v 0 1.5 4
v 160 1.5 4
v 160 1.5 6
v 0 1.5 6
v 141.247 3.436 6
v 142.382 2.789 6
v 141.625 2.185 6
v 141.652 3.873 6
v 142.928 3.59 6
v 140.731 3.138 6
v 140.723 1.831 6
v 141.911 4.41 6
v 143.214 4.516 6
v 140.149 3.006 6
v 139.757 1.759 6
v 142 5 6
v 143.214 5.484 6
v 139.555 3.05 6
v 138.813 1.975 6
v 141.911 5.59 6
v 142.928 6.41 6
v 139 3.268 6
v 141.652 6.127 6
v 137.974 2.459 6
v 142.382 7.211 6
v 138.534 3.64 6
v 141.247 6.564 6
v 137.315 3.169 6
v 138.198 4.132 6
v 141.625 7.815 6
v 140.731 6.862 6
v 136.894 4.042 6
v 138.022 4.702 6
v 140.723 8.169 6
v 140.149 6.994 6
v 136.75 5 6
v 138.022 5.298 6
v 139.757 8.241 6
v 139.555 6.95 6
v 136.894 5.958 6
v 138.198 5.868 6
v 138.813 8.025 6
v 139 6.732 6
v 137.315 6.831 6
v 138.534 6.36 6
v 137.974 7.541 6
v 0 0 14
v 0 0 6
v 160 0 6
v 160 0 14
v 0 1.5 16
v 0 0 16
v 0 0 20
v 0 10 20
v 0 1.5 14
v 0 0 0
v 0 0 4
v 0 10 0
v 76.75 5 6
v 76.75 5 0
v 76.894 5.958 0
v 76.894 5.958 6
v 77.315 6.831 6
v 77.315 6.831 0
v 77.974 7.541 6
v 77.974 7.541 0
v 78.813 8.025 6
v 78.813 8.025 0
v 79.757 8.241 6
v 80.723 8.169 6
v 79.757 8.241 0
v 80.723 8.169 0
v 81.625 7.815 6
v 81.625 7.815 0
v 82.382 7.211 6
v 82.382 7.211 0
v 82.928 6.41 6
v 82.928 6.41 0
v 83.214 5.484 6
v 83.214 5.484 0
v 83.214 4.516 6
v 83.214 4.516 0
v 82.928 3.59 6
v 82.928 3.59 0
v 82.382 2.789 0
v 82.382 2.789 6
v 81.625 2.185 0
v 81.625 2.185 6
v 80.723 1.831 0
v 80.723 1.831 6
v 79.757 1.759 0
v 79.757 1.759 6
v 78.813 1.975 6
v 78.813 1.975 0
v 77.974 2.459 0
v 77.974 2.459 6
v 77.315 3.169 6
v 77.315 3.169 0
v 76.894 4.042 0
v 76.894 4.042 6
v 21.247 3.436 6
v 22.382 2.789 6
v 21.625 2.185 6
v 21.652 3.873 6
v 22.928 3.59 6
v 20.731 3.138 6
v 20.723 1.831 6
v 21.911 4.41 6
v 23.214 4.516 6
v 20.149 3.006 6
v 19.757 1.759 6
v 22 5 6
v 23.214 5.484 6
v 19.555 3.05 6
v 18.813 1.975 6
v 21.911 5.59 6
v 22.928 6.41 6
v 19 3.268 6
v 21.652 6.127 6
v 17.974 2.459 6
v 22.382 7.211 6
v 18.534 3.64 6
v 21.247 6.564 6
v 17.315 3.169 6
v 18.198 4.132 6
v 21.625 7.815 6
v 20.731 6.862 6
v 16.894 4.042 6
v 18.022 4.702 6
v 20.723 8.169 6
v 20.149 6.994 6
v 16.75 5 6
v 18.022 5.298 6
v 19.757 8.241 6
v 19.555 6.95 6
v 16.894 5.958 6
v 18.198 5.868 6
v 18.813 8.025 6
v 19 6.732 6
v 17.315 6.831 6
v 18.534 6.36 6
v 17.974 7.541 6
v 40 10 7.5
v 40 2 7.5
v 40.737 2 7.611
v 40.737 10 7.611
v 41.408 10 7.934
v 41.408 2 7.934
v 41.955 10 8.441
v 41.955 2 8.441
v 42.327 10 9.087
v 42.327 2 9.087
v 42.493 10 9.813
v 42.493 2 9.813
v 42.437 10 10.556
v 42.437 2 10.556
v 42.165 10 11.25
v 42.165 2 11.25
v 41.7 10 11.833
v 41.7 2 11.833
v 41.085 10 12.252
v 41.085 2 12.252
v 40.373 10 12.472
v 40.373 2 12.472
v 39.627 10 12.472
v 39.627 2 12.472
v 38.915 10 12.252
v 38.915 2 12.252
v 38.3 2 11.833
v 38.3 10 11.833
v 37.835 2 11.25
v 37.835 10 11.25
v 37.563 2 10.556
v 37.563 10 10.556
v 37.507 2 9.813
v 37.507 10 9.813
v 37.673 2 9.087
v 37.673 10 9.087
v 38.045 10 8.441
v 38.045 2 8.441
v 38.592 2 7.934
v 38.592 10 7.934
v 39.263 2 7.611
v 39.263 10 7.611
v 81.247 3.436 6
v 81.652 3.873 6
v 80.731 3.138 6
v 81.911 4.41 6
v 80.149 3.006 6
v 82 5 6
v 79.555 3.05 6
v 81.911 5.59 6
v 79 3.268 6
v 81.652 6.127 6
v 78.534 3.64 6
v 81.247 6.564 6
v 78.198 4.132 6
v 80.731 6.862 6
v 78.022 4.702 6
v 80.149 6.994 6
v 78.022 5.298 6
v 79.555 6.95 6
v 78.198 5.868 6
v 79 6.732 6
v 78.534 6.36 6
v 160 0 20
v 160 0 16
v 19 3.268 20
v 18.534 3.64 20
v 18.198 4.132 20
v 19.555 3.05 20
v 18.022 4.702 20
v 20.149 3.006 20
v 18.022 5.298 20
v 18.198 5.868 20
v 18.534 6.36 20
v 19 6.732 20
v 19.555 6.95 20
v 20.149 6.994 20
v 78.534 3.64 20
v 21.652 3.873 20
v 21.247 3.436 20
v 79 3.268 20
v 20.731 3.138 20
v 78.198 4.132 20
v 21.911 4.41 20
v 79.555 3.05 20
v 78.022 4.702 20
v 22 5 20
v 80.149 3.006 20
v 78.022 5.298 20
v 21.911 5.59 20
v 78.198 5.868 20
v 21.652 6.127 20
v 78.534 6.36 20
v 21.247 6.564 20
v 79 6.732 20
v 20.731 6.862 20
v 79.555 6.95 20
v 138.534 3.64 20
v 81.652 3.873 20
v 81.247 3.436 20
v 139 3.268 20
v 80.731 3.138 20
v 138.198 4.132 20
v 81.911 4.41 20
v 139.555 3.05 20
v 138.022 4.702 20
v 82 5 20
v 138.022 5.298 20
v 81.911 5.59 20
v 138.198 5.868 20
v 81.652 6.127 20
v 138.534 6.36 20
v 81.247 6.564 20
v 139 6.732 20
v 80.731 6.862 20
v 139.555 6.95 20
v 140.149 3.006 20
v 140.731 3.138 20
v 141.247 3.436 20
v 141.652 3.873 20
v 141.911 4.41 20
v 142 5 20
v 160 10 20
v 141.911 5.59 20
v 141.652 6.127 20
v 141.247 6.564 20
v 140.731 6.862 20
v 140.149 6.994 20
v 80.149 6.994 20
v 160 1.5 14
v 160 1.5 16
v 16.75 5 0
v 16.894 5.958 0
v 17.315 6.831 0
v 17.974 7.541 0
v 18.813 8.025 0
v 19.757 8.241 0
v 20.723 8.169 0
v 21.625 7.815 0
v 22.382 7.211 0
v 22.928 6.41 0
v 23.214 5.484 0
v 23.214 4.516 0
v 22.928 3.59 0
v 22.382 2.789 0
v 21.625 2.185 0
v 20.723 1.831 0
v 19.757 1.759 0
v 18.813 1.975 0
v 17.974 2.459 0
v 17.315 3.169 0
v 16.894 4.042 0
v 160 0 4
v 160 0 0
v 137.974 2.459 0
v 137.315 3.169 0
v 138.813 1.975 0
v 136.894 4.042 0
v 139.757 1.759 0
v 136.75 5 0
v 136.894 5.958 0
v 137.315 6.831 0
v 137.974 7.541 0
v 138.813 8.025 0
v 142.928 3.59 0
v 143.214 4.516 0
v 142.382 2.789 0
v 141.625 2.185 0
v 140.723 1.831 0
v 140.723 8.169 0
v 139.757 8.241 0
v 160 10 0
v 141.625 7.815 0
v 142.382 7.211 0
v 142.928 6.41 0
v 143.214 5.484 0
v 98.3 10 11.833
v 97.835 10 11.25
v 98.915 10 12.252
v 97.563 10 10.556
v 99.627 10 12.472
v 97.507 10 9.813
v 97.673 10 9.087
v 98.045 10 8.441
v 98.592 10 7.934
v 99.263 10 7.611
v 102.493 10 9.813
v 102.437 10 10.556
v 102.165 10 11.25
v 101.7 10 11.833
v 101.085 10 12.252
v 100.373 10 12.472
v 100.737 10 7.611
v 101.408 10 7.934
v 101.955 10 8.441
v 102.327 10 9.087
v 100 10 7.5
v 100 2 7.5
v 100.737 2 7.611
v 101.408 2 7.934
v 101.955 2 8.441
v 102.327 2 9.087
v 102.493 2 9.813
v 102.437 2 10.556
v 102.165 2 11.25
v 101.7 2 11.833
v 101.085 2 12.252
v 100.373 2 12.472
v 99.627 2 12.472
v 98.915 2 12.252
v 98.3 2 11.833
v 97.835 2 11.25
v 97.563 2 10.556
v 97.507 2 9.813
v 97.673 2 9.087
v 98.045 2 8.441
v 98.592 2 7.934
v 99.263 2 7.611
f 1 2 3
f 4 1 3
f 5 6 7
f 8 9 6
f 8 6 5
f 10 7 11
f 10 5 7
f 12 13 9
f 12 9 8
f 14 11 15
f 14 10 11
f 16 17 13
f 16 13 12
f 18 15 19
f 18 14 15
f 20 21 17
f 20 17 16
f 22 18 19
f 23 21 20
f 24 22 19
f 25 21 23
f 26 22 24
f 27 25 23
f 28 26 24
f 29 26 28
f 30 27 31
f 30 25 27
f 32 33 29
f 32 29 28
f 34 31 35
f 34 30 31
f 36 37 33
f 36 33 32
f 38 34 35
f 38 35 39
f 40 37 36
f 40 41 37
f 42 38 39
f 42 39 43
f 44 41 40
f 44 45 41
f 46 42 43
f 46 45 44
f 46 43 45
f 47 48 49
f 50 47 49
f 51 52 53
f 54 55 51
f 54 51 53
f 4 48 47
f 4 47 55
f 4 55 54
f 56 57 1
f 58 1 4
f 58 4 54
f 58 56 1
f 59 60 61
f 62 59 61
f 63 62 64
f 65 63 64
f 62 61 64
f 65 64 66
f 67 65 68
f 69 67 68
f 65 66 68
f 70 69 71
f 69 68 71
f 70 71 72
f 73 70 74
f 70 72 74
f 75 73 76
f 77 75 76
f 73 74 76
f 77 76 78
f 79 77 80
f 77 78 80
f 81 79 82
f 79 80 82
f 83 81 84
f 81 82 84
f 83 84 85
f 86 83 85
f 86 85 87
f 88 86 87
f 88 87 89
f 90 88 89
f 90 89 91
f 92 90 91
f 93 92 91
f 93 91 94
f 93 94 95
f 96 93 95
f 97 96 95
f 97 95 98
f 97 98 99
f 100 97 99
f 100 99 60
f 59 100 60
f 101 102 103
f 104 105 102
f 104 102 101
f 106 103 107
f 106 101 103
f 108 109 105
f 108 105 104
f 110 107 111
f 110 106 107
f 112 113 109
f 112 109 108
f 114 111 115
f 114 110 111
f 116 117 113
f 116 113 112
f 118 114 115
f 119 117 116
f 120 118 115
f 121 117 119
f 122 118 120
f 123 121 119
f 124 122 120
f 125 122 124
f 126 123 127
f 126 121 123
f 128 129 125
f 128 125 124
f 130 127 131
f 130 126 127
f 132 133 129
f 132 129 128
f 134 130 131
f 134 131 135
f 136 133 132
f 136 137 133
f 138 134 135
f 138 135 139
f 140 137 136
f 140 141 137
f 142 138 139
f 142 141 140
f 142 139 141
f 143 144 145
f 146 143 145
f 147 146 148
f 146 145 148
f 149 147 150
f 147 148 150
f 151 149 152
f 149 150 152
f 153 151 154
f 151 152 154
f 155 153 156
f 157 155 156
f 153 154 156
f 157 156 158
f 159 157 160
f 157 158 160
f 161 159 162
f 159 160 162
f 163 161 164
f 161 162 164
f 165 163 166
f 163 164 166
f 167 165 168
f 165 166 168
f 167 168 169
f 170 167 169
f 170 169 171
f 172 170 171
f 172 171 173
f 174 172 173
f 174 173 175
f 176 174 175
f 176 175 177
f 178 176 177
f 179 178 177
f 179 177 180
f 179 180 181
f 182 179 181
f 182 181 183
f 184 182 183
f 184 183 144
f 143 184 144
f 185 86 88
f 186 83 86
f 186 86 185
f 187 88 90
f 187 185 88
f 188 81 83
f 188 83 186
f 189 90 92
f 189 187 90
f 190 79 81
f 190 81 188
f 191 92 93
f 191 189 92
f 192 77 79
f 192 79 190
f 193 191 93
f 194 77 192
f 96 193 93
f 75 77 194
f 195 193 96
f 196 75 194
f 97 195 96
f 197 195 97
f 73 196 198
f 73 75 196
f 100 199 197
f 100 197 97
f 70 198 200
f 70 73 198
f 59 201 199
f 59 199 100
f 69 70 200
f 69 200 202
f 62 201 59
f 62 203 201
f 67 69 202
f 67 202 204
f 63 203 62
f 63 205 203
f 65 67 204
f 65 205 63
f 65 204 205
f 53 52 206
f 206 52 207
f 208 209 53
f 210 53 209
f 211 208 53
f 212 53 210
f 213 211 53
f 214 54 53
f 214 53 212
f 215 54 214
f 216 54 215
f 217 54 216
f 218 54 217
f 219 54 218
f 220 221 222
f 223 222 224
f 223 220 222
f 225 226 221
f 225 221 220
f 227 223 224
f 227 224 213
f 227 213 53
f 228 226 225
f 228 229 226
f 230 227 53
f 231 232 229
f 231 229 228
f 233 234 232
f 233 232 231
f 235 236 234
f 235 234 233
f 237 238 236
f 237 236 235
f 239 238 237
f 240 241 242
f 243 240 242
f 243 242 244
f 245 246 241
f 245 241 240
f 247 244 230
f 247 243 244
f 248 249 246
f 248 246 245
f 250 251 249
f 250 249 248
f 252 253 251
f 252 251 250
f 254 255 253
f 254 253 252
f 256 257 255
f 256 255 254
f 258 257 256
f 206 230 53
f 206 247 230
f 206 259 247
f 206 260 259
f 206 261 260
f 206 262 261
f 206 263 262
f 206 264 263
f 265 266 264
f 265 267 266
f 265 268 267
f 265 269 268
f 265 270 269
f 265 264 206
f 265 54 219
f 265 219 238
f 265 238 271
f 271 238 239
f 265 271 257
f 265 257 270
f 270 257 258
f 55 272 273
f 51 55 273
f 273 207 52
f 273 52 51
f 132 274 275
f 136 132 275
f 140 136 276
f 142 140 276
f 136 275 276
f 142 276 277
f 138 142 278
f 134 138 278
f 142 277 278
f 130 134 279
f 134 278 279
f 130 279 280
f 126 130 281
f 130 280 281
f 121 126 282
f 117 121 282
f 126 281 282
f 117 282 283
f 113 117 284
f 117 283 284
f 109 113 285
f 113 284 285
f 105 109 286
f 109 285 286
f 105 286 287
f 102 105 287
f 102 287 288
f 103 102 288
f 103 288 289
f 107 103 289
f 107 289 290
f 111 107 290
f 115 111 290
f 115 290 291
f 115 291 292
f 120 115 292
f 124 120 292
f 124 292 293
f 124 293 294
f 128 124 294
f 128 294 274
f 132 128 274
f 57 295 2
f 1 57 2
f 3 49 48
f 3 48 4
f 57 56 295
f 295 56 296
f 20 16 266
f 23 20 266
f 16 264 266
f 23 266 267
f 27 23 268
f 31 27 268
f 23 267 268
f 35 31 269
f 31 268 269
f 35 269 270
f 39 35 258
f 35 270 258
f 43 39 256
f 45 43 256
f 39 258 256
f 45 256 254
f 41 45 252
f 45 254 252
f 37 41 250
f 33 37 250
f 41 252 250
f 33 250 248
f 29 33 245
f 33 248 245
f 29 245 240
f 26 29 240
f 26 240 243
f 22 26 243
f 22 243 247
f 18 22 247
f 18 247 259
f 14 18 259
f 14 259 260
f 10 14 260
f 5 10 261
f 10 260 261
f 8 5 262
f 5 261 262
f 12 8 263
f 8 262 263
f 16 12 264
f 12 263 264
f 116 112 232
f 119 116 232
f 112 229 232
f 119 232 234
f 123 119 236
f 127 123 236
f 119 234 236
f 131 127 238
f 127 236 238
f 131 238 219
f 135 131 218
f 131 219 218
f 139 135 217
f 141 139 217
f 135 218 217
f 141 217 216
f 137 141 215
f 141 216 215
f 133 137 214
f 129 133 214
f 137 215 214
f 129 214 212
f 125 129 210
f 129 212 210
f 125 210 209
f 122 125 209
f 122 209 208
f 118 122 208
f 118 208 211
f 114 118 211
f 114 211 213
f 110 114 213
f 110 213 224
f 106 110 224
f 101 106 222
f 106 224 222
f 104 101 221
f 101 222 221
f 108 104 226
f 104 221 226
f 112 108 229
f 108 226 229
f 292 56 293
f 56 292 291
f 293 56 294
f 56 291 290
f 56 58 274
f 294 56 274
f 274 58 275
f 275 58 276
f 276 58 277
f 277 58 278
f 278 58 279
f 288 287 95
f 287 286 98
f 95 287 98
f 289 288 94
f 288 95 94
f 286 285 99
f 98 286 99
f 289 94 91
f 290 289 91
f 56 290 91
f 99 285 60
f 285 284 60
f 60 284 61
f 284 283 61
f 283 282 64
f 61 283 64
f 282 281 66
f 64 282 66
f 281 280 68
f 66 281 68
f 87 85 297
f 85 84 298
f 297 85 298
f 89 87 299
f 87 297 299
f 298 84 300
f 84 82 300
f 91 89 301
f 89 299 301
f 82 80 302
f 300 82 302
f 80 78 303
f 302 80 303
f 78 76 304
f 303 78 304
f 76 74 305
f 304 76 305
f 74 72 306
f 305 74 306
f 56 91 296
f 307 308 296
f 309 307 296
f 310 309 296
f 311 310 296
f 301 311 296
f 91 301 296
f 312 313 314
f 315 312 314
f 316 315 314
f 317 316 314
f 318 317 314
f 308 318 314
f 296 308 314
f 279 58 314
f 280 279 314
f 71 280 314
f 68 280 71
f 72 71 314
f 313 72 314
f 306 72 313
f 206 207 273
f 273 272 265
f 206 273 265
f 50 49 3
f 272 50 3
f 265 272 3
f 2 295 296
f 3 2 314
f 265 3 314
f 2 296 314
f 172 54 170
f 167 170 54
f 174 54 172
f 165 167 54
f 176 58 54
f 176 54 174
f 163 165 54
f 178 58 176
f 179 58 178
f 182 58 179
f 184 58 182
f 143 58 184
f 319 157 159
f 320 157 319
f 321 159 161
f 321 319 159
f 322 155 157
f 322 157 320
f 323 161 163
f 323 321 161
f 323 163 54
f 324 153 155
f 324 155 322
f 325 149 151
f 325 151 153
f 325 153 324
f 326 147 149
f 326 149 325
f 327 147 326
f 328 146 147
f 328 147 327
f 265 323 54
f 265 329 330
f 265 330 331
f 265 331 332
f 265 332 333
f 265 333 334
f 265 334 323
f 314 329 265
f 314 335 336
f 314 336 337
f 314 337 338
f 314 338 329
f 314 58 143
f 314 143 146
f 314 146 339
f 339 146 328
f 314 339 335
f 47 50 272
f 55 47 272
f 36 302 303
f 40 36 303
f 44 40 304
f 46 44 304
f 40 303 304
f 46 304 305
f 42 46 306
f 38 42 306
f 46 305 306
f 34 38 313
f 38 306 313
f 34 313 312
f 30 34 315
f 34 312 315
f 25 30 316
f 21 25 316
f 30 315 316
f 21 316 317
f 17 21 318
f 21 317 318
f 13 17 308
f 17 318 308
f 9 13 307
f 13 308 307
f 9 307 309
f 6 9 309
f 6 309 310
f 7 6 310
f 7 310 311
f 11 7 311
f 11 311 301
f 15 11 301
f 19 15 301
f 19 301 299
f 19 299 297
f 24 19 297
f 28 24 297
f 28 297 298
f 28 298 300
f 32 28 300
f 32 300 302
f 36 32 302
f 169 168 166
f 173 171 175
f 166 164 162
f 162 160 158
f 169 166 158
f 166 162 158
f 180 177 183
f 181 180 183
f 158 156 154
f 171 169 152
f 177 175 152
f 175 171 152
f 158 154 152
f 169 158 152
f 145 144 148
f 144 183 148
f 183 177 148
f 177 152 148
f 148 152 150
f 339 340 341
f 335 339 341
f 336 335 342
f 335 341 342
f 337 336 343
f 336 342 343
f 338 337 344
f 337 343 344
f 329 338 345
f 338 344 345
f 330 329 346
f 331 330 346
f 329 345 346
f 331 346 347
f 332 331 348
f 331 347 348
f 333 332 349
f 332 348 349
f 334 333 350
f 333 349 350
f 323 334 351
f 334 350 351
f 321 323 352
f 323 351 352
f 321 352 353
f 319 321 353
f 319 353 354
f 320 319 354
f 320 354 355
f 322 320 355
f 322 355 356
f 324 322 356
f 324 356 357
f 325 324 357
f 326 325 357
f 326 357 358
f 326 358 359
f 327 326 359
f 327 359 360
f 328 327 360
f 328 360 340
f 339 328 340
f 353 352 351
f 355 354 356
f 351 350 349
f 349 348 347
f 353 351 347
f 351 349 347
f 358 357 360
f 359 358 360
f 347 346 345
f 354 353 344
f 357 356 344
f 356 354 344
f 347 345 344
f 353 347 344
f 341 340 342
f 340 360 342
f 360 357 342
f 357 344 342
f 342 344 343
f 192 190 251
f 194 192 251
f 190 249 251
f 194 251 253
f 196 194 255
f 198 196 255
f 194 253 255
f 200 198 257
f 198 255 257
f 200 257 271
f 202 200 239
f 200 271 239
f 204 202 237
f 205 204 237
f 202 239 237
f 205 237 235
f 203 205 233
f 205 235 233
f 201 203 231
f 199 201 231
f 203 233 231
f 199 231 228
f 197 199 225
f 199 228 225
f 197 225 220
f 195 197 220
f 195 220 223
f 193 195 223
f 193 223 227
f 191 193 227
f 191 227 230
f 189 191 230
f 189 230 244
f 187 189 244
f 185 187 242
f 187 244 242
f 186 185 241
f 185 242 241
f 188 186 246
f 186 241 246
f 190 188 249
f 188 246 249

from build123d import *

# Parameters (mm, degrees)
IZIM1_W                                      = 160
IZIM1_H                                      = 10
Y_KSEKLIK_EKSTR_ZYON1_DEPTH                  = 20
F_4_0MM_SAPLAMA_DELIKLERI1_D                 = 5
F_4_0MM_SAPLAMA_DELIKLERI1_DEPTH             = 8
IZIM6_W                                      = 2
IZIM6_H                                      = 1.5
KES_EKSTR_ZYON1_DEPTH                        = 162.554944214
M5_ALT_GEN_BA_L_C_VATA_IN_HAV_A1_D           = 4
M5_ALT_GEN_BA_L_C_VATA_IN_HAV_A1_CBORE_D     = 6.5
M5_ALT_GEN_BA_L_C_VATA_IN_HAV_A1_CBORE_DEPTH = 6


with BuildPart() as part:
    # Çizim1 → Yükseklik-Ekstrüzyon1 (new body)
    with BuildSketch(Plane.XY):
        with Locations((80, 5)):
            Rectangle(IZIM1_W, IZIM1_H)
    extrude(amount=Y_KSEKLIK_EKSTR_ZYON1_DEPTH)

    # Ø4.0mm Saplama Delikleri1
    with Locations(Plane(origin=(40, 10, 10), x_dir=(0, 0, 1), z_dir=(0, 1, 0))):
        with Locations((0, 0), (0, 60)):
            Hole(F_4_0MM_SAPLAMA_DELIKLERI1_D / 2, depth=F_4_0MM_SAPLAMA_DELIKLERI1_DEPTH)

    # Çizim6 → Kes-Ekstrüzyon1 (cut, through all)
    with BuildSketch(Plane.ZY):
        with Locations((5, 0.75)):
            Rectangle(IZIM6_W, IZIM6_H)
        with Locations((15, 0.75)):
            Rectangle(IZIM6_W, IZIM6_H)
    extrude(amount=-KES_EKSTR_ZYON1_DEPTH, mode=Mode.SUBTRACT)

    # M5 Altıgen Başlı Cıvata İçin Havşa1 (through all)
    with Locations(Plane(origin=(140, 5, 0), x_dir=(-1, 0, 0), z_dir=(0, 0, -1))):
        with Locations((0, 0), (60, 0), (120, 0)):
            CounterBoreHole(M5_ALT_GEN_BA_L_C_VATA_IN_HAV_A1_D / 2, M5_ALT_GEN_BA_L_C_VATA_IN_HAV_A1_CBORE_D / 2, M5_ALT_GEN_BA_L_C_VATA_IN_HAV_A1_CBORE_DEPTH)


solid = part.part
